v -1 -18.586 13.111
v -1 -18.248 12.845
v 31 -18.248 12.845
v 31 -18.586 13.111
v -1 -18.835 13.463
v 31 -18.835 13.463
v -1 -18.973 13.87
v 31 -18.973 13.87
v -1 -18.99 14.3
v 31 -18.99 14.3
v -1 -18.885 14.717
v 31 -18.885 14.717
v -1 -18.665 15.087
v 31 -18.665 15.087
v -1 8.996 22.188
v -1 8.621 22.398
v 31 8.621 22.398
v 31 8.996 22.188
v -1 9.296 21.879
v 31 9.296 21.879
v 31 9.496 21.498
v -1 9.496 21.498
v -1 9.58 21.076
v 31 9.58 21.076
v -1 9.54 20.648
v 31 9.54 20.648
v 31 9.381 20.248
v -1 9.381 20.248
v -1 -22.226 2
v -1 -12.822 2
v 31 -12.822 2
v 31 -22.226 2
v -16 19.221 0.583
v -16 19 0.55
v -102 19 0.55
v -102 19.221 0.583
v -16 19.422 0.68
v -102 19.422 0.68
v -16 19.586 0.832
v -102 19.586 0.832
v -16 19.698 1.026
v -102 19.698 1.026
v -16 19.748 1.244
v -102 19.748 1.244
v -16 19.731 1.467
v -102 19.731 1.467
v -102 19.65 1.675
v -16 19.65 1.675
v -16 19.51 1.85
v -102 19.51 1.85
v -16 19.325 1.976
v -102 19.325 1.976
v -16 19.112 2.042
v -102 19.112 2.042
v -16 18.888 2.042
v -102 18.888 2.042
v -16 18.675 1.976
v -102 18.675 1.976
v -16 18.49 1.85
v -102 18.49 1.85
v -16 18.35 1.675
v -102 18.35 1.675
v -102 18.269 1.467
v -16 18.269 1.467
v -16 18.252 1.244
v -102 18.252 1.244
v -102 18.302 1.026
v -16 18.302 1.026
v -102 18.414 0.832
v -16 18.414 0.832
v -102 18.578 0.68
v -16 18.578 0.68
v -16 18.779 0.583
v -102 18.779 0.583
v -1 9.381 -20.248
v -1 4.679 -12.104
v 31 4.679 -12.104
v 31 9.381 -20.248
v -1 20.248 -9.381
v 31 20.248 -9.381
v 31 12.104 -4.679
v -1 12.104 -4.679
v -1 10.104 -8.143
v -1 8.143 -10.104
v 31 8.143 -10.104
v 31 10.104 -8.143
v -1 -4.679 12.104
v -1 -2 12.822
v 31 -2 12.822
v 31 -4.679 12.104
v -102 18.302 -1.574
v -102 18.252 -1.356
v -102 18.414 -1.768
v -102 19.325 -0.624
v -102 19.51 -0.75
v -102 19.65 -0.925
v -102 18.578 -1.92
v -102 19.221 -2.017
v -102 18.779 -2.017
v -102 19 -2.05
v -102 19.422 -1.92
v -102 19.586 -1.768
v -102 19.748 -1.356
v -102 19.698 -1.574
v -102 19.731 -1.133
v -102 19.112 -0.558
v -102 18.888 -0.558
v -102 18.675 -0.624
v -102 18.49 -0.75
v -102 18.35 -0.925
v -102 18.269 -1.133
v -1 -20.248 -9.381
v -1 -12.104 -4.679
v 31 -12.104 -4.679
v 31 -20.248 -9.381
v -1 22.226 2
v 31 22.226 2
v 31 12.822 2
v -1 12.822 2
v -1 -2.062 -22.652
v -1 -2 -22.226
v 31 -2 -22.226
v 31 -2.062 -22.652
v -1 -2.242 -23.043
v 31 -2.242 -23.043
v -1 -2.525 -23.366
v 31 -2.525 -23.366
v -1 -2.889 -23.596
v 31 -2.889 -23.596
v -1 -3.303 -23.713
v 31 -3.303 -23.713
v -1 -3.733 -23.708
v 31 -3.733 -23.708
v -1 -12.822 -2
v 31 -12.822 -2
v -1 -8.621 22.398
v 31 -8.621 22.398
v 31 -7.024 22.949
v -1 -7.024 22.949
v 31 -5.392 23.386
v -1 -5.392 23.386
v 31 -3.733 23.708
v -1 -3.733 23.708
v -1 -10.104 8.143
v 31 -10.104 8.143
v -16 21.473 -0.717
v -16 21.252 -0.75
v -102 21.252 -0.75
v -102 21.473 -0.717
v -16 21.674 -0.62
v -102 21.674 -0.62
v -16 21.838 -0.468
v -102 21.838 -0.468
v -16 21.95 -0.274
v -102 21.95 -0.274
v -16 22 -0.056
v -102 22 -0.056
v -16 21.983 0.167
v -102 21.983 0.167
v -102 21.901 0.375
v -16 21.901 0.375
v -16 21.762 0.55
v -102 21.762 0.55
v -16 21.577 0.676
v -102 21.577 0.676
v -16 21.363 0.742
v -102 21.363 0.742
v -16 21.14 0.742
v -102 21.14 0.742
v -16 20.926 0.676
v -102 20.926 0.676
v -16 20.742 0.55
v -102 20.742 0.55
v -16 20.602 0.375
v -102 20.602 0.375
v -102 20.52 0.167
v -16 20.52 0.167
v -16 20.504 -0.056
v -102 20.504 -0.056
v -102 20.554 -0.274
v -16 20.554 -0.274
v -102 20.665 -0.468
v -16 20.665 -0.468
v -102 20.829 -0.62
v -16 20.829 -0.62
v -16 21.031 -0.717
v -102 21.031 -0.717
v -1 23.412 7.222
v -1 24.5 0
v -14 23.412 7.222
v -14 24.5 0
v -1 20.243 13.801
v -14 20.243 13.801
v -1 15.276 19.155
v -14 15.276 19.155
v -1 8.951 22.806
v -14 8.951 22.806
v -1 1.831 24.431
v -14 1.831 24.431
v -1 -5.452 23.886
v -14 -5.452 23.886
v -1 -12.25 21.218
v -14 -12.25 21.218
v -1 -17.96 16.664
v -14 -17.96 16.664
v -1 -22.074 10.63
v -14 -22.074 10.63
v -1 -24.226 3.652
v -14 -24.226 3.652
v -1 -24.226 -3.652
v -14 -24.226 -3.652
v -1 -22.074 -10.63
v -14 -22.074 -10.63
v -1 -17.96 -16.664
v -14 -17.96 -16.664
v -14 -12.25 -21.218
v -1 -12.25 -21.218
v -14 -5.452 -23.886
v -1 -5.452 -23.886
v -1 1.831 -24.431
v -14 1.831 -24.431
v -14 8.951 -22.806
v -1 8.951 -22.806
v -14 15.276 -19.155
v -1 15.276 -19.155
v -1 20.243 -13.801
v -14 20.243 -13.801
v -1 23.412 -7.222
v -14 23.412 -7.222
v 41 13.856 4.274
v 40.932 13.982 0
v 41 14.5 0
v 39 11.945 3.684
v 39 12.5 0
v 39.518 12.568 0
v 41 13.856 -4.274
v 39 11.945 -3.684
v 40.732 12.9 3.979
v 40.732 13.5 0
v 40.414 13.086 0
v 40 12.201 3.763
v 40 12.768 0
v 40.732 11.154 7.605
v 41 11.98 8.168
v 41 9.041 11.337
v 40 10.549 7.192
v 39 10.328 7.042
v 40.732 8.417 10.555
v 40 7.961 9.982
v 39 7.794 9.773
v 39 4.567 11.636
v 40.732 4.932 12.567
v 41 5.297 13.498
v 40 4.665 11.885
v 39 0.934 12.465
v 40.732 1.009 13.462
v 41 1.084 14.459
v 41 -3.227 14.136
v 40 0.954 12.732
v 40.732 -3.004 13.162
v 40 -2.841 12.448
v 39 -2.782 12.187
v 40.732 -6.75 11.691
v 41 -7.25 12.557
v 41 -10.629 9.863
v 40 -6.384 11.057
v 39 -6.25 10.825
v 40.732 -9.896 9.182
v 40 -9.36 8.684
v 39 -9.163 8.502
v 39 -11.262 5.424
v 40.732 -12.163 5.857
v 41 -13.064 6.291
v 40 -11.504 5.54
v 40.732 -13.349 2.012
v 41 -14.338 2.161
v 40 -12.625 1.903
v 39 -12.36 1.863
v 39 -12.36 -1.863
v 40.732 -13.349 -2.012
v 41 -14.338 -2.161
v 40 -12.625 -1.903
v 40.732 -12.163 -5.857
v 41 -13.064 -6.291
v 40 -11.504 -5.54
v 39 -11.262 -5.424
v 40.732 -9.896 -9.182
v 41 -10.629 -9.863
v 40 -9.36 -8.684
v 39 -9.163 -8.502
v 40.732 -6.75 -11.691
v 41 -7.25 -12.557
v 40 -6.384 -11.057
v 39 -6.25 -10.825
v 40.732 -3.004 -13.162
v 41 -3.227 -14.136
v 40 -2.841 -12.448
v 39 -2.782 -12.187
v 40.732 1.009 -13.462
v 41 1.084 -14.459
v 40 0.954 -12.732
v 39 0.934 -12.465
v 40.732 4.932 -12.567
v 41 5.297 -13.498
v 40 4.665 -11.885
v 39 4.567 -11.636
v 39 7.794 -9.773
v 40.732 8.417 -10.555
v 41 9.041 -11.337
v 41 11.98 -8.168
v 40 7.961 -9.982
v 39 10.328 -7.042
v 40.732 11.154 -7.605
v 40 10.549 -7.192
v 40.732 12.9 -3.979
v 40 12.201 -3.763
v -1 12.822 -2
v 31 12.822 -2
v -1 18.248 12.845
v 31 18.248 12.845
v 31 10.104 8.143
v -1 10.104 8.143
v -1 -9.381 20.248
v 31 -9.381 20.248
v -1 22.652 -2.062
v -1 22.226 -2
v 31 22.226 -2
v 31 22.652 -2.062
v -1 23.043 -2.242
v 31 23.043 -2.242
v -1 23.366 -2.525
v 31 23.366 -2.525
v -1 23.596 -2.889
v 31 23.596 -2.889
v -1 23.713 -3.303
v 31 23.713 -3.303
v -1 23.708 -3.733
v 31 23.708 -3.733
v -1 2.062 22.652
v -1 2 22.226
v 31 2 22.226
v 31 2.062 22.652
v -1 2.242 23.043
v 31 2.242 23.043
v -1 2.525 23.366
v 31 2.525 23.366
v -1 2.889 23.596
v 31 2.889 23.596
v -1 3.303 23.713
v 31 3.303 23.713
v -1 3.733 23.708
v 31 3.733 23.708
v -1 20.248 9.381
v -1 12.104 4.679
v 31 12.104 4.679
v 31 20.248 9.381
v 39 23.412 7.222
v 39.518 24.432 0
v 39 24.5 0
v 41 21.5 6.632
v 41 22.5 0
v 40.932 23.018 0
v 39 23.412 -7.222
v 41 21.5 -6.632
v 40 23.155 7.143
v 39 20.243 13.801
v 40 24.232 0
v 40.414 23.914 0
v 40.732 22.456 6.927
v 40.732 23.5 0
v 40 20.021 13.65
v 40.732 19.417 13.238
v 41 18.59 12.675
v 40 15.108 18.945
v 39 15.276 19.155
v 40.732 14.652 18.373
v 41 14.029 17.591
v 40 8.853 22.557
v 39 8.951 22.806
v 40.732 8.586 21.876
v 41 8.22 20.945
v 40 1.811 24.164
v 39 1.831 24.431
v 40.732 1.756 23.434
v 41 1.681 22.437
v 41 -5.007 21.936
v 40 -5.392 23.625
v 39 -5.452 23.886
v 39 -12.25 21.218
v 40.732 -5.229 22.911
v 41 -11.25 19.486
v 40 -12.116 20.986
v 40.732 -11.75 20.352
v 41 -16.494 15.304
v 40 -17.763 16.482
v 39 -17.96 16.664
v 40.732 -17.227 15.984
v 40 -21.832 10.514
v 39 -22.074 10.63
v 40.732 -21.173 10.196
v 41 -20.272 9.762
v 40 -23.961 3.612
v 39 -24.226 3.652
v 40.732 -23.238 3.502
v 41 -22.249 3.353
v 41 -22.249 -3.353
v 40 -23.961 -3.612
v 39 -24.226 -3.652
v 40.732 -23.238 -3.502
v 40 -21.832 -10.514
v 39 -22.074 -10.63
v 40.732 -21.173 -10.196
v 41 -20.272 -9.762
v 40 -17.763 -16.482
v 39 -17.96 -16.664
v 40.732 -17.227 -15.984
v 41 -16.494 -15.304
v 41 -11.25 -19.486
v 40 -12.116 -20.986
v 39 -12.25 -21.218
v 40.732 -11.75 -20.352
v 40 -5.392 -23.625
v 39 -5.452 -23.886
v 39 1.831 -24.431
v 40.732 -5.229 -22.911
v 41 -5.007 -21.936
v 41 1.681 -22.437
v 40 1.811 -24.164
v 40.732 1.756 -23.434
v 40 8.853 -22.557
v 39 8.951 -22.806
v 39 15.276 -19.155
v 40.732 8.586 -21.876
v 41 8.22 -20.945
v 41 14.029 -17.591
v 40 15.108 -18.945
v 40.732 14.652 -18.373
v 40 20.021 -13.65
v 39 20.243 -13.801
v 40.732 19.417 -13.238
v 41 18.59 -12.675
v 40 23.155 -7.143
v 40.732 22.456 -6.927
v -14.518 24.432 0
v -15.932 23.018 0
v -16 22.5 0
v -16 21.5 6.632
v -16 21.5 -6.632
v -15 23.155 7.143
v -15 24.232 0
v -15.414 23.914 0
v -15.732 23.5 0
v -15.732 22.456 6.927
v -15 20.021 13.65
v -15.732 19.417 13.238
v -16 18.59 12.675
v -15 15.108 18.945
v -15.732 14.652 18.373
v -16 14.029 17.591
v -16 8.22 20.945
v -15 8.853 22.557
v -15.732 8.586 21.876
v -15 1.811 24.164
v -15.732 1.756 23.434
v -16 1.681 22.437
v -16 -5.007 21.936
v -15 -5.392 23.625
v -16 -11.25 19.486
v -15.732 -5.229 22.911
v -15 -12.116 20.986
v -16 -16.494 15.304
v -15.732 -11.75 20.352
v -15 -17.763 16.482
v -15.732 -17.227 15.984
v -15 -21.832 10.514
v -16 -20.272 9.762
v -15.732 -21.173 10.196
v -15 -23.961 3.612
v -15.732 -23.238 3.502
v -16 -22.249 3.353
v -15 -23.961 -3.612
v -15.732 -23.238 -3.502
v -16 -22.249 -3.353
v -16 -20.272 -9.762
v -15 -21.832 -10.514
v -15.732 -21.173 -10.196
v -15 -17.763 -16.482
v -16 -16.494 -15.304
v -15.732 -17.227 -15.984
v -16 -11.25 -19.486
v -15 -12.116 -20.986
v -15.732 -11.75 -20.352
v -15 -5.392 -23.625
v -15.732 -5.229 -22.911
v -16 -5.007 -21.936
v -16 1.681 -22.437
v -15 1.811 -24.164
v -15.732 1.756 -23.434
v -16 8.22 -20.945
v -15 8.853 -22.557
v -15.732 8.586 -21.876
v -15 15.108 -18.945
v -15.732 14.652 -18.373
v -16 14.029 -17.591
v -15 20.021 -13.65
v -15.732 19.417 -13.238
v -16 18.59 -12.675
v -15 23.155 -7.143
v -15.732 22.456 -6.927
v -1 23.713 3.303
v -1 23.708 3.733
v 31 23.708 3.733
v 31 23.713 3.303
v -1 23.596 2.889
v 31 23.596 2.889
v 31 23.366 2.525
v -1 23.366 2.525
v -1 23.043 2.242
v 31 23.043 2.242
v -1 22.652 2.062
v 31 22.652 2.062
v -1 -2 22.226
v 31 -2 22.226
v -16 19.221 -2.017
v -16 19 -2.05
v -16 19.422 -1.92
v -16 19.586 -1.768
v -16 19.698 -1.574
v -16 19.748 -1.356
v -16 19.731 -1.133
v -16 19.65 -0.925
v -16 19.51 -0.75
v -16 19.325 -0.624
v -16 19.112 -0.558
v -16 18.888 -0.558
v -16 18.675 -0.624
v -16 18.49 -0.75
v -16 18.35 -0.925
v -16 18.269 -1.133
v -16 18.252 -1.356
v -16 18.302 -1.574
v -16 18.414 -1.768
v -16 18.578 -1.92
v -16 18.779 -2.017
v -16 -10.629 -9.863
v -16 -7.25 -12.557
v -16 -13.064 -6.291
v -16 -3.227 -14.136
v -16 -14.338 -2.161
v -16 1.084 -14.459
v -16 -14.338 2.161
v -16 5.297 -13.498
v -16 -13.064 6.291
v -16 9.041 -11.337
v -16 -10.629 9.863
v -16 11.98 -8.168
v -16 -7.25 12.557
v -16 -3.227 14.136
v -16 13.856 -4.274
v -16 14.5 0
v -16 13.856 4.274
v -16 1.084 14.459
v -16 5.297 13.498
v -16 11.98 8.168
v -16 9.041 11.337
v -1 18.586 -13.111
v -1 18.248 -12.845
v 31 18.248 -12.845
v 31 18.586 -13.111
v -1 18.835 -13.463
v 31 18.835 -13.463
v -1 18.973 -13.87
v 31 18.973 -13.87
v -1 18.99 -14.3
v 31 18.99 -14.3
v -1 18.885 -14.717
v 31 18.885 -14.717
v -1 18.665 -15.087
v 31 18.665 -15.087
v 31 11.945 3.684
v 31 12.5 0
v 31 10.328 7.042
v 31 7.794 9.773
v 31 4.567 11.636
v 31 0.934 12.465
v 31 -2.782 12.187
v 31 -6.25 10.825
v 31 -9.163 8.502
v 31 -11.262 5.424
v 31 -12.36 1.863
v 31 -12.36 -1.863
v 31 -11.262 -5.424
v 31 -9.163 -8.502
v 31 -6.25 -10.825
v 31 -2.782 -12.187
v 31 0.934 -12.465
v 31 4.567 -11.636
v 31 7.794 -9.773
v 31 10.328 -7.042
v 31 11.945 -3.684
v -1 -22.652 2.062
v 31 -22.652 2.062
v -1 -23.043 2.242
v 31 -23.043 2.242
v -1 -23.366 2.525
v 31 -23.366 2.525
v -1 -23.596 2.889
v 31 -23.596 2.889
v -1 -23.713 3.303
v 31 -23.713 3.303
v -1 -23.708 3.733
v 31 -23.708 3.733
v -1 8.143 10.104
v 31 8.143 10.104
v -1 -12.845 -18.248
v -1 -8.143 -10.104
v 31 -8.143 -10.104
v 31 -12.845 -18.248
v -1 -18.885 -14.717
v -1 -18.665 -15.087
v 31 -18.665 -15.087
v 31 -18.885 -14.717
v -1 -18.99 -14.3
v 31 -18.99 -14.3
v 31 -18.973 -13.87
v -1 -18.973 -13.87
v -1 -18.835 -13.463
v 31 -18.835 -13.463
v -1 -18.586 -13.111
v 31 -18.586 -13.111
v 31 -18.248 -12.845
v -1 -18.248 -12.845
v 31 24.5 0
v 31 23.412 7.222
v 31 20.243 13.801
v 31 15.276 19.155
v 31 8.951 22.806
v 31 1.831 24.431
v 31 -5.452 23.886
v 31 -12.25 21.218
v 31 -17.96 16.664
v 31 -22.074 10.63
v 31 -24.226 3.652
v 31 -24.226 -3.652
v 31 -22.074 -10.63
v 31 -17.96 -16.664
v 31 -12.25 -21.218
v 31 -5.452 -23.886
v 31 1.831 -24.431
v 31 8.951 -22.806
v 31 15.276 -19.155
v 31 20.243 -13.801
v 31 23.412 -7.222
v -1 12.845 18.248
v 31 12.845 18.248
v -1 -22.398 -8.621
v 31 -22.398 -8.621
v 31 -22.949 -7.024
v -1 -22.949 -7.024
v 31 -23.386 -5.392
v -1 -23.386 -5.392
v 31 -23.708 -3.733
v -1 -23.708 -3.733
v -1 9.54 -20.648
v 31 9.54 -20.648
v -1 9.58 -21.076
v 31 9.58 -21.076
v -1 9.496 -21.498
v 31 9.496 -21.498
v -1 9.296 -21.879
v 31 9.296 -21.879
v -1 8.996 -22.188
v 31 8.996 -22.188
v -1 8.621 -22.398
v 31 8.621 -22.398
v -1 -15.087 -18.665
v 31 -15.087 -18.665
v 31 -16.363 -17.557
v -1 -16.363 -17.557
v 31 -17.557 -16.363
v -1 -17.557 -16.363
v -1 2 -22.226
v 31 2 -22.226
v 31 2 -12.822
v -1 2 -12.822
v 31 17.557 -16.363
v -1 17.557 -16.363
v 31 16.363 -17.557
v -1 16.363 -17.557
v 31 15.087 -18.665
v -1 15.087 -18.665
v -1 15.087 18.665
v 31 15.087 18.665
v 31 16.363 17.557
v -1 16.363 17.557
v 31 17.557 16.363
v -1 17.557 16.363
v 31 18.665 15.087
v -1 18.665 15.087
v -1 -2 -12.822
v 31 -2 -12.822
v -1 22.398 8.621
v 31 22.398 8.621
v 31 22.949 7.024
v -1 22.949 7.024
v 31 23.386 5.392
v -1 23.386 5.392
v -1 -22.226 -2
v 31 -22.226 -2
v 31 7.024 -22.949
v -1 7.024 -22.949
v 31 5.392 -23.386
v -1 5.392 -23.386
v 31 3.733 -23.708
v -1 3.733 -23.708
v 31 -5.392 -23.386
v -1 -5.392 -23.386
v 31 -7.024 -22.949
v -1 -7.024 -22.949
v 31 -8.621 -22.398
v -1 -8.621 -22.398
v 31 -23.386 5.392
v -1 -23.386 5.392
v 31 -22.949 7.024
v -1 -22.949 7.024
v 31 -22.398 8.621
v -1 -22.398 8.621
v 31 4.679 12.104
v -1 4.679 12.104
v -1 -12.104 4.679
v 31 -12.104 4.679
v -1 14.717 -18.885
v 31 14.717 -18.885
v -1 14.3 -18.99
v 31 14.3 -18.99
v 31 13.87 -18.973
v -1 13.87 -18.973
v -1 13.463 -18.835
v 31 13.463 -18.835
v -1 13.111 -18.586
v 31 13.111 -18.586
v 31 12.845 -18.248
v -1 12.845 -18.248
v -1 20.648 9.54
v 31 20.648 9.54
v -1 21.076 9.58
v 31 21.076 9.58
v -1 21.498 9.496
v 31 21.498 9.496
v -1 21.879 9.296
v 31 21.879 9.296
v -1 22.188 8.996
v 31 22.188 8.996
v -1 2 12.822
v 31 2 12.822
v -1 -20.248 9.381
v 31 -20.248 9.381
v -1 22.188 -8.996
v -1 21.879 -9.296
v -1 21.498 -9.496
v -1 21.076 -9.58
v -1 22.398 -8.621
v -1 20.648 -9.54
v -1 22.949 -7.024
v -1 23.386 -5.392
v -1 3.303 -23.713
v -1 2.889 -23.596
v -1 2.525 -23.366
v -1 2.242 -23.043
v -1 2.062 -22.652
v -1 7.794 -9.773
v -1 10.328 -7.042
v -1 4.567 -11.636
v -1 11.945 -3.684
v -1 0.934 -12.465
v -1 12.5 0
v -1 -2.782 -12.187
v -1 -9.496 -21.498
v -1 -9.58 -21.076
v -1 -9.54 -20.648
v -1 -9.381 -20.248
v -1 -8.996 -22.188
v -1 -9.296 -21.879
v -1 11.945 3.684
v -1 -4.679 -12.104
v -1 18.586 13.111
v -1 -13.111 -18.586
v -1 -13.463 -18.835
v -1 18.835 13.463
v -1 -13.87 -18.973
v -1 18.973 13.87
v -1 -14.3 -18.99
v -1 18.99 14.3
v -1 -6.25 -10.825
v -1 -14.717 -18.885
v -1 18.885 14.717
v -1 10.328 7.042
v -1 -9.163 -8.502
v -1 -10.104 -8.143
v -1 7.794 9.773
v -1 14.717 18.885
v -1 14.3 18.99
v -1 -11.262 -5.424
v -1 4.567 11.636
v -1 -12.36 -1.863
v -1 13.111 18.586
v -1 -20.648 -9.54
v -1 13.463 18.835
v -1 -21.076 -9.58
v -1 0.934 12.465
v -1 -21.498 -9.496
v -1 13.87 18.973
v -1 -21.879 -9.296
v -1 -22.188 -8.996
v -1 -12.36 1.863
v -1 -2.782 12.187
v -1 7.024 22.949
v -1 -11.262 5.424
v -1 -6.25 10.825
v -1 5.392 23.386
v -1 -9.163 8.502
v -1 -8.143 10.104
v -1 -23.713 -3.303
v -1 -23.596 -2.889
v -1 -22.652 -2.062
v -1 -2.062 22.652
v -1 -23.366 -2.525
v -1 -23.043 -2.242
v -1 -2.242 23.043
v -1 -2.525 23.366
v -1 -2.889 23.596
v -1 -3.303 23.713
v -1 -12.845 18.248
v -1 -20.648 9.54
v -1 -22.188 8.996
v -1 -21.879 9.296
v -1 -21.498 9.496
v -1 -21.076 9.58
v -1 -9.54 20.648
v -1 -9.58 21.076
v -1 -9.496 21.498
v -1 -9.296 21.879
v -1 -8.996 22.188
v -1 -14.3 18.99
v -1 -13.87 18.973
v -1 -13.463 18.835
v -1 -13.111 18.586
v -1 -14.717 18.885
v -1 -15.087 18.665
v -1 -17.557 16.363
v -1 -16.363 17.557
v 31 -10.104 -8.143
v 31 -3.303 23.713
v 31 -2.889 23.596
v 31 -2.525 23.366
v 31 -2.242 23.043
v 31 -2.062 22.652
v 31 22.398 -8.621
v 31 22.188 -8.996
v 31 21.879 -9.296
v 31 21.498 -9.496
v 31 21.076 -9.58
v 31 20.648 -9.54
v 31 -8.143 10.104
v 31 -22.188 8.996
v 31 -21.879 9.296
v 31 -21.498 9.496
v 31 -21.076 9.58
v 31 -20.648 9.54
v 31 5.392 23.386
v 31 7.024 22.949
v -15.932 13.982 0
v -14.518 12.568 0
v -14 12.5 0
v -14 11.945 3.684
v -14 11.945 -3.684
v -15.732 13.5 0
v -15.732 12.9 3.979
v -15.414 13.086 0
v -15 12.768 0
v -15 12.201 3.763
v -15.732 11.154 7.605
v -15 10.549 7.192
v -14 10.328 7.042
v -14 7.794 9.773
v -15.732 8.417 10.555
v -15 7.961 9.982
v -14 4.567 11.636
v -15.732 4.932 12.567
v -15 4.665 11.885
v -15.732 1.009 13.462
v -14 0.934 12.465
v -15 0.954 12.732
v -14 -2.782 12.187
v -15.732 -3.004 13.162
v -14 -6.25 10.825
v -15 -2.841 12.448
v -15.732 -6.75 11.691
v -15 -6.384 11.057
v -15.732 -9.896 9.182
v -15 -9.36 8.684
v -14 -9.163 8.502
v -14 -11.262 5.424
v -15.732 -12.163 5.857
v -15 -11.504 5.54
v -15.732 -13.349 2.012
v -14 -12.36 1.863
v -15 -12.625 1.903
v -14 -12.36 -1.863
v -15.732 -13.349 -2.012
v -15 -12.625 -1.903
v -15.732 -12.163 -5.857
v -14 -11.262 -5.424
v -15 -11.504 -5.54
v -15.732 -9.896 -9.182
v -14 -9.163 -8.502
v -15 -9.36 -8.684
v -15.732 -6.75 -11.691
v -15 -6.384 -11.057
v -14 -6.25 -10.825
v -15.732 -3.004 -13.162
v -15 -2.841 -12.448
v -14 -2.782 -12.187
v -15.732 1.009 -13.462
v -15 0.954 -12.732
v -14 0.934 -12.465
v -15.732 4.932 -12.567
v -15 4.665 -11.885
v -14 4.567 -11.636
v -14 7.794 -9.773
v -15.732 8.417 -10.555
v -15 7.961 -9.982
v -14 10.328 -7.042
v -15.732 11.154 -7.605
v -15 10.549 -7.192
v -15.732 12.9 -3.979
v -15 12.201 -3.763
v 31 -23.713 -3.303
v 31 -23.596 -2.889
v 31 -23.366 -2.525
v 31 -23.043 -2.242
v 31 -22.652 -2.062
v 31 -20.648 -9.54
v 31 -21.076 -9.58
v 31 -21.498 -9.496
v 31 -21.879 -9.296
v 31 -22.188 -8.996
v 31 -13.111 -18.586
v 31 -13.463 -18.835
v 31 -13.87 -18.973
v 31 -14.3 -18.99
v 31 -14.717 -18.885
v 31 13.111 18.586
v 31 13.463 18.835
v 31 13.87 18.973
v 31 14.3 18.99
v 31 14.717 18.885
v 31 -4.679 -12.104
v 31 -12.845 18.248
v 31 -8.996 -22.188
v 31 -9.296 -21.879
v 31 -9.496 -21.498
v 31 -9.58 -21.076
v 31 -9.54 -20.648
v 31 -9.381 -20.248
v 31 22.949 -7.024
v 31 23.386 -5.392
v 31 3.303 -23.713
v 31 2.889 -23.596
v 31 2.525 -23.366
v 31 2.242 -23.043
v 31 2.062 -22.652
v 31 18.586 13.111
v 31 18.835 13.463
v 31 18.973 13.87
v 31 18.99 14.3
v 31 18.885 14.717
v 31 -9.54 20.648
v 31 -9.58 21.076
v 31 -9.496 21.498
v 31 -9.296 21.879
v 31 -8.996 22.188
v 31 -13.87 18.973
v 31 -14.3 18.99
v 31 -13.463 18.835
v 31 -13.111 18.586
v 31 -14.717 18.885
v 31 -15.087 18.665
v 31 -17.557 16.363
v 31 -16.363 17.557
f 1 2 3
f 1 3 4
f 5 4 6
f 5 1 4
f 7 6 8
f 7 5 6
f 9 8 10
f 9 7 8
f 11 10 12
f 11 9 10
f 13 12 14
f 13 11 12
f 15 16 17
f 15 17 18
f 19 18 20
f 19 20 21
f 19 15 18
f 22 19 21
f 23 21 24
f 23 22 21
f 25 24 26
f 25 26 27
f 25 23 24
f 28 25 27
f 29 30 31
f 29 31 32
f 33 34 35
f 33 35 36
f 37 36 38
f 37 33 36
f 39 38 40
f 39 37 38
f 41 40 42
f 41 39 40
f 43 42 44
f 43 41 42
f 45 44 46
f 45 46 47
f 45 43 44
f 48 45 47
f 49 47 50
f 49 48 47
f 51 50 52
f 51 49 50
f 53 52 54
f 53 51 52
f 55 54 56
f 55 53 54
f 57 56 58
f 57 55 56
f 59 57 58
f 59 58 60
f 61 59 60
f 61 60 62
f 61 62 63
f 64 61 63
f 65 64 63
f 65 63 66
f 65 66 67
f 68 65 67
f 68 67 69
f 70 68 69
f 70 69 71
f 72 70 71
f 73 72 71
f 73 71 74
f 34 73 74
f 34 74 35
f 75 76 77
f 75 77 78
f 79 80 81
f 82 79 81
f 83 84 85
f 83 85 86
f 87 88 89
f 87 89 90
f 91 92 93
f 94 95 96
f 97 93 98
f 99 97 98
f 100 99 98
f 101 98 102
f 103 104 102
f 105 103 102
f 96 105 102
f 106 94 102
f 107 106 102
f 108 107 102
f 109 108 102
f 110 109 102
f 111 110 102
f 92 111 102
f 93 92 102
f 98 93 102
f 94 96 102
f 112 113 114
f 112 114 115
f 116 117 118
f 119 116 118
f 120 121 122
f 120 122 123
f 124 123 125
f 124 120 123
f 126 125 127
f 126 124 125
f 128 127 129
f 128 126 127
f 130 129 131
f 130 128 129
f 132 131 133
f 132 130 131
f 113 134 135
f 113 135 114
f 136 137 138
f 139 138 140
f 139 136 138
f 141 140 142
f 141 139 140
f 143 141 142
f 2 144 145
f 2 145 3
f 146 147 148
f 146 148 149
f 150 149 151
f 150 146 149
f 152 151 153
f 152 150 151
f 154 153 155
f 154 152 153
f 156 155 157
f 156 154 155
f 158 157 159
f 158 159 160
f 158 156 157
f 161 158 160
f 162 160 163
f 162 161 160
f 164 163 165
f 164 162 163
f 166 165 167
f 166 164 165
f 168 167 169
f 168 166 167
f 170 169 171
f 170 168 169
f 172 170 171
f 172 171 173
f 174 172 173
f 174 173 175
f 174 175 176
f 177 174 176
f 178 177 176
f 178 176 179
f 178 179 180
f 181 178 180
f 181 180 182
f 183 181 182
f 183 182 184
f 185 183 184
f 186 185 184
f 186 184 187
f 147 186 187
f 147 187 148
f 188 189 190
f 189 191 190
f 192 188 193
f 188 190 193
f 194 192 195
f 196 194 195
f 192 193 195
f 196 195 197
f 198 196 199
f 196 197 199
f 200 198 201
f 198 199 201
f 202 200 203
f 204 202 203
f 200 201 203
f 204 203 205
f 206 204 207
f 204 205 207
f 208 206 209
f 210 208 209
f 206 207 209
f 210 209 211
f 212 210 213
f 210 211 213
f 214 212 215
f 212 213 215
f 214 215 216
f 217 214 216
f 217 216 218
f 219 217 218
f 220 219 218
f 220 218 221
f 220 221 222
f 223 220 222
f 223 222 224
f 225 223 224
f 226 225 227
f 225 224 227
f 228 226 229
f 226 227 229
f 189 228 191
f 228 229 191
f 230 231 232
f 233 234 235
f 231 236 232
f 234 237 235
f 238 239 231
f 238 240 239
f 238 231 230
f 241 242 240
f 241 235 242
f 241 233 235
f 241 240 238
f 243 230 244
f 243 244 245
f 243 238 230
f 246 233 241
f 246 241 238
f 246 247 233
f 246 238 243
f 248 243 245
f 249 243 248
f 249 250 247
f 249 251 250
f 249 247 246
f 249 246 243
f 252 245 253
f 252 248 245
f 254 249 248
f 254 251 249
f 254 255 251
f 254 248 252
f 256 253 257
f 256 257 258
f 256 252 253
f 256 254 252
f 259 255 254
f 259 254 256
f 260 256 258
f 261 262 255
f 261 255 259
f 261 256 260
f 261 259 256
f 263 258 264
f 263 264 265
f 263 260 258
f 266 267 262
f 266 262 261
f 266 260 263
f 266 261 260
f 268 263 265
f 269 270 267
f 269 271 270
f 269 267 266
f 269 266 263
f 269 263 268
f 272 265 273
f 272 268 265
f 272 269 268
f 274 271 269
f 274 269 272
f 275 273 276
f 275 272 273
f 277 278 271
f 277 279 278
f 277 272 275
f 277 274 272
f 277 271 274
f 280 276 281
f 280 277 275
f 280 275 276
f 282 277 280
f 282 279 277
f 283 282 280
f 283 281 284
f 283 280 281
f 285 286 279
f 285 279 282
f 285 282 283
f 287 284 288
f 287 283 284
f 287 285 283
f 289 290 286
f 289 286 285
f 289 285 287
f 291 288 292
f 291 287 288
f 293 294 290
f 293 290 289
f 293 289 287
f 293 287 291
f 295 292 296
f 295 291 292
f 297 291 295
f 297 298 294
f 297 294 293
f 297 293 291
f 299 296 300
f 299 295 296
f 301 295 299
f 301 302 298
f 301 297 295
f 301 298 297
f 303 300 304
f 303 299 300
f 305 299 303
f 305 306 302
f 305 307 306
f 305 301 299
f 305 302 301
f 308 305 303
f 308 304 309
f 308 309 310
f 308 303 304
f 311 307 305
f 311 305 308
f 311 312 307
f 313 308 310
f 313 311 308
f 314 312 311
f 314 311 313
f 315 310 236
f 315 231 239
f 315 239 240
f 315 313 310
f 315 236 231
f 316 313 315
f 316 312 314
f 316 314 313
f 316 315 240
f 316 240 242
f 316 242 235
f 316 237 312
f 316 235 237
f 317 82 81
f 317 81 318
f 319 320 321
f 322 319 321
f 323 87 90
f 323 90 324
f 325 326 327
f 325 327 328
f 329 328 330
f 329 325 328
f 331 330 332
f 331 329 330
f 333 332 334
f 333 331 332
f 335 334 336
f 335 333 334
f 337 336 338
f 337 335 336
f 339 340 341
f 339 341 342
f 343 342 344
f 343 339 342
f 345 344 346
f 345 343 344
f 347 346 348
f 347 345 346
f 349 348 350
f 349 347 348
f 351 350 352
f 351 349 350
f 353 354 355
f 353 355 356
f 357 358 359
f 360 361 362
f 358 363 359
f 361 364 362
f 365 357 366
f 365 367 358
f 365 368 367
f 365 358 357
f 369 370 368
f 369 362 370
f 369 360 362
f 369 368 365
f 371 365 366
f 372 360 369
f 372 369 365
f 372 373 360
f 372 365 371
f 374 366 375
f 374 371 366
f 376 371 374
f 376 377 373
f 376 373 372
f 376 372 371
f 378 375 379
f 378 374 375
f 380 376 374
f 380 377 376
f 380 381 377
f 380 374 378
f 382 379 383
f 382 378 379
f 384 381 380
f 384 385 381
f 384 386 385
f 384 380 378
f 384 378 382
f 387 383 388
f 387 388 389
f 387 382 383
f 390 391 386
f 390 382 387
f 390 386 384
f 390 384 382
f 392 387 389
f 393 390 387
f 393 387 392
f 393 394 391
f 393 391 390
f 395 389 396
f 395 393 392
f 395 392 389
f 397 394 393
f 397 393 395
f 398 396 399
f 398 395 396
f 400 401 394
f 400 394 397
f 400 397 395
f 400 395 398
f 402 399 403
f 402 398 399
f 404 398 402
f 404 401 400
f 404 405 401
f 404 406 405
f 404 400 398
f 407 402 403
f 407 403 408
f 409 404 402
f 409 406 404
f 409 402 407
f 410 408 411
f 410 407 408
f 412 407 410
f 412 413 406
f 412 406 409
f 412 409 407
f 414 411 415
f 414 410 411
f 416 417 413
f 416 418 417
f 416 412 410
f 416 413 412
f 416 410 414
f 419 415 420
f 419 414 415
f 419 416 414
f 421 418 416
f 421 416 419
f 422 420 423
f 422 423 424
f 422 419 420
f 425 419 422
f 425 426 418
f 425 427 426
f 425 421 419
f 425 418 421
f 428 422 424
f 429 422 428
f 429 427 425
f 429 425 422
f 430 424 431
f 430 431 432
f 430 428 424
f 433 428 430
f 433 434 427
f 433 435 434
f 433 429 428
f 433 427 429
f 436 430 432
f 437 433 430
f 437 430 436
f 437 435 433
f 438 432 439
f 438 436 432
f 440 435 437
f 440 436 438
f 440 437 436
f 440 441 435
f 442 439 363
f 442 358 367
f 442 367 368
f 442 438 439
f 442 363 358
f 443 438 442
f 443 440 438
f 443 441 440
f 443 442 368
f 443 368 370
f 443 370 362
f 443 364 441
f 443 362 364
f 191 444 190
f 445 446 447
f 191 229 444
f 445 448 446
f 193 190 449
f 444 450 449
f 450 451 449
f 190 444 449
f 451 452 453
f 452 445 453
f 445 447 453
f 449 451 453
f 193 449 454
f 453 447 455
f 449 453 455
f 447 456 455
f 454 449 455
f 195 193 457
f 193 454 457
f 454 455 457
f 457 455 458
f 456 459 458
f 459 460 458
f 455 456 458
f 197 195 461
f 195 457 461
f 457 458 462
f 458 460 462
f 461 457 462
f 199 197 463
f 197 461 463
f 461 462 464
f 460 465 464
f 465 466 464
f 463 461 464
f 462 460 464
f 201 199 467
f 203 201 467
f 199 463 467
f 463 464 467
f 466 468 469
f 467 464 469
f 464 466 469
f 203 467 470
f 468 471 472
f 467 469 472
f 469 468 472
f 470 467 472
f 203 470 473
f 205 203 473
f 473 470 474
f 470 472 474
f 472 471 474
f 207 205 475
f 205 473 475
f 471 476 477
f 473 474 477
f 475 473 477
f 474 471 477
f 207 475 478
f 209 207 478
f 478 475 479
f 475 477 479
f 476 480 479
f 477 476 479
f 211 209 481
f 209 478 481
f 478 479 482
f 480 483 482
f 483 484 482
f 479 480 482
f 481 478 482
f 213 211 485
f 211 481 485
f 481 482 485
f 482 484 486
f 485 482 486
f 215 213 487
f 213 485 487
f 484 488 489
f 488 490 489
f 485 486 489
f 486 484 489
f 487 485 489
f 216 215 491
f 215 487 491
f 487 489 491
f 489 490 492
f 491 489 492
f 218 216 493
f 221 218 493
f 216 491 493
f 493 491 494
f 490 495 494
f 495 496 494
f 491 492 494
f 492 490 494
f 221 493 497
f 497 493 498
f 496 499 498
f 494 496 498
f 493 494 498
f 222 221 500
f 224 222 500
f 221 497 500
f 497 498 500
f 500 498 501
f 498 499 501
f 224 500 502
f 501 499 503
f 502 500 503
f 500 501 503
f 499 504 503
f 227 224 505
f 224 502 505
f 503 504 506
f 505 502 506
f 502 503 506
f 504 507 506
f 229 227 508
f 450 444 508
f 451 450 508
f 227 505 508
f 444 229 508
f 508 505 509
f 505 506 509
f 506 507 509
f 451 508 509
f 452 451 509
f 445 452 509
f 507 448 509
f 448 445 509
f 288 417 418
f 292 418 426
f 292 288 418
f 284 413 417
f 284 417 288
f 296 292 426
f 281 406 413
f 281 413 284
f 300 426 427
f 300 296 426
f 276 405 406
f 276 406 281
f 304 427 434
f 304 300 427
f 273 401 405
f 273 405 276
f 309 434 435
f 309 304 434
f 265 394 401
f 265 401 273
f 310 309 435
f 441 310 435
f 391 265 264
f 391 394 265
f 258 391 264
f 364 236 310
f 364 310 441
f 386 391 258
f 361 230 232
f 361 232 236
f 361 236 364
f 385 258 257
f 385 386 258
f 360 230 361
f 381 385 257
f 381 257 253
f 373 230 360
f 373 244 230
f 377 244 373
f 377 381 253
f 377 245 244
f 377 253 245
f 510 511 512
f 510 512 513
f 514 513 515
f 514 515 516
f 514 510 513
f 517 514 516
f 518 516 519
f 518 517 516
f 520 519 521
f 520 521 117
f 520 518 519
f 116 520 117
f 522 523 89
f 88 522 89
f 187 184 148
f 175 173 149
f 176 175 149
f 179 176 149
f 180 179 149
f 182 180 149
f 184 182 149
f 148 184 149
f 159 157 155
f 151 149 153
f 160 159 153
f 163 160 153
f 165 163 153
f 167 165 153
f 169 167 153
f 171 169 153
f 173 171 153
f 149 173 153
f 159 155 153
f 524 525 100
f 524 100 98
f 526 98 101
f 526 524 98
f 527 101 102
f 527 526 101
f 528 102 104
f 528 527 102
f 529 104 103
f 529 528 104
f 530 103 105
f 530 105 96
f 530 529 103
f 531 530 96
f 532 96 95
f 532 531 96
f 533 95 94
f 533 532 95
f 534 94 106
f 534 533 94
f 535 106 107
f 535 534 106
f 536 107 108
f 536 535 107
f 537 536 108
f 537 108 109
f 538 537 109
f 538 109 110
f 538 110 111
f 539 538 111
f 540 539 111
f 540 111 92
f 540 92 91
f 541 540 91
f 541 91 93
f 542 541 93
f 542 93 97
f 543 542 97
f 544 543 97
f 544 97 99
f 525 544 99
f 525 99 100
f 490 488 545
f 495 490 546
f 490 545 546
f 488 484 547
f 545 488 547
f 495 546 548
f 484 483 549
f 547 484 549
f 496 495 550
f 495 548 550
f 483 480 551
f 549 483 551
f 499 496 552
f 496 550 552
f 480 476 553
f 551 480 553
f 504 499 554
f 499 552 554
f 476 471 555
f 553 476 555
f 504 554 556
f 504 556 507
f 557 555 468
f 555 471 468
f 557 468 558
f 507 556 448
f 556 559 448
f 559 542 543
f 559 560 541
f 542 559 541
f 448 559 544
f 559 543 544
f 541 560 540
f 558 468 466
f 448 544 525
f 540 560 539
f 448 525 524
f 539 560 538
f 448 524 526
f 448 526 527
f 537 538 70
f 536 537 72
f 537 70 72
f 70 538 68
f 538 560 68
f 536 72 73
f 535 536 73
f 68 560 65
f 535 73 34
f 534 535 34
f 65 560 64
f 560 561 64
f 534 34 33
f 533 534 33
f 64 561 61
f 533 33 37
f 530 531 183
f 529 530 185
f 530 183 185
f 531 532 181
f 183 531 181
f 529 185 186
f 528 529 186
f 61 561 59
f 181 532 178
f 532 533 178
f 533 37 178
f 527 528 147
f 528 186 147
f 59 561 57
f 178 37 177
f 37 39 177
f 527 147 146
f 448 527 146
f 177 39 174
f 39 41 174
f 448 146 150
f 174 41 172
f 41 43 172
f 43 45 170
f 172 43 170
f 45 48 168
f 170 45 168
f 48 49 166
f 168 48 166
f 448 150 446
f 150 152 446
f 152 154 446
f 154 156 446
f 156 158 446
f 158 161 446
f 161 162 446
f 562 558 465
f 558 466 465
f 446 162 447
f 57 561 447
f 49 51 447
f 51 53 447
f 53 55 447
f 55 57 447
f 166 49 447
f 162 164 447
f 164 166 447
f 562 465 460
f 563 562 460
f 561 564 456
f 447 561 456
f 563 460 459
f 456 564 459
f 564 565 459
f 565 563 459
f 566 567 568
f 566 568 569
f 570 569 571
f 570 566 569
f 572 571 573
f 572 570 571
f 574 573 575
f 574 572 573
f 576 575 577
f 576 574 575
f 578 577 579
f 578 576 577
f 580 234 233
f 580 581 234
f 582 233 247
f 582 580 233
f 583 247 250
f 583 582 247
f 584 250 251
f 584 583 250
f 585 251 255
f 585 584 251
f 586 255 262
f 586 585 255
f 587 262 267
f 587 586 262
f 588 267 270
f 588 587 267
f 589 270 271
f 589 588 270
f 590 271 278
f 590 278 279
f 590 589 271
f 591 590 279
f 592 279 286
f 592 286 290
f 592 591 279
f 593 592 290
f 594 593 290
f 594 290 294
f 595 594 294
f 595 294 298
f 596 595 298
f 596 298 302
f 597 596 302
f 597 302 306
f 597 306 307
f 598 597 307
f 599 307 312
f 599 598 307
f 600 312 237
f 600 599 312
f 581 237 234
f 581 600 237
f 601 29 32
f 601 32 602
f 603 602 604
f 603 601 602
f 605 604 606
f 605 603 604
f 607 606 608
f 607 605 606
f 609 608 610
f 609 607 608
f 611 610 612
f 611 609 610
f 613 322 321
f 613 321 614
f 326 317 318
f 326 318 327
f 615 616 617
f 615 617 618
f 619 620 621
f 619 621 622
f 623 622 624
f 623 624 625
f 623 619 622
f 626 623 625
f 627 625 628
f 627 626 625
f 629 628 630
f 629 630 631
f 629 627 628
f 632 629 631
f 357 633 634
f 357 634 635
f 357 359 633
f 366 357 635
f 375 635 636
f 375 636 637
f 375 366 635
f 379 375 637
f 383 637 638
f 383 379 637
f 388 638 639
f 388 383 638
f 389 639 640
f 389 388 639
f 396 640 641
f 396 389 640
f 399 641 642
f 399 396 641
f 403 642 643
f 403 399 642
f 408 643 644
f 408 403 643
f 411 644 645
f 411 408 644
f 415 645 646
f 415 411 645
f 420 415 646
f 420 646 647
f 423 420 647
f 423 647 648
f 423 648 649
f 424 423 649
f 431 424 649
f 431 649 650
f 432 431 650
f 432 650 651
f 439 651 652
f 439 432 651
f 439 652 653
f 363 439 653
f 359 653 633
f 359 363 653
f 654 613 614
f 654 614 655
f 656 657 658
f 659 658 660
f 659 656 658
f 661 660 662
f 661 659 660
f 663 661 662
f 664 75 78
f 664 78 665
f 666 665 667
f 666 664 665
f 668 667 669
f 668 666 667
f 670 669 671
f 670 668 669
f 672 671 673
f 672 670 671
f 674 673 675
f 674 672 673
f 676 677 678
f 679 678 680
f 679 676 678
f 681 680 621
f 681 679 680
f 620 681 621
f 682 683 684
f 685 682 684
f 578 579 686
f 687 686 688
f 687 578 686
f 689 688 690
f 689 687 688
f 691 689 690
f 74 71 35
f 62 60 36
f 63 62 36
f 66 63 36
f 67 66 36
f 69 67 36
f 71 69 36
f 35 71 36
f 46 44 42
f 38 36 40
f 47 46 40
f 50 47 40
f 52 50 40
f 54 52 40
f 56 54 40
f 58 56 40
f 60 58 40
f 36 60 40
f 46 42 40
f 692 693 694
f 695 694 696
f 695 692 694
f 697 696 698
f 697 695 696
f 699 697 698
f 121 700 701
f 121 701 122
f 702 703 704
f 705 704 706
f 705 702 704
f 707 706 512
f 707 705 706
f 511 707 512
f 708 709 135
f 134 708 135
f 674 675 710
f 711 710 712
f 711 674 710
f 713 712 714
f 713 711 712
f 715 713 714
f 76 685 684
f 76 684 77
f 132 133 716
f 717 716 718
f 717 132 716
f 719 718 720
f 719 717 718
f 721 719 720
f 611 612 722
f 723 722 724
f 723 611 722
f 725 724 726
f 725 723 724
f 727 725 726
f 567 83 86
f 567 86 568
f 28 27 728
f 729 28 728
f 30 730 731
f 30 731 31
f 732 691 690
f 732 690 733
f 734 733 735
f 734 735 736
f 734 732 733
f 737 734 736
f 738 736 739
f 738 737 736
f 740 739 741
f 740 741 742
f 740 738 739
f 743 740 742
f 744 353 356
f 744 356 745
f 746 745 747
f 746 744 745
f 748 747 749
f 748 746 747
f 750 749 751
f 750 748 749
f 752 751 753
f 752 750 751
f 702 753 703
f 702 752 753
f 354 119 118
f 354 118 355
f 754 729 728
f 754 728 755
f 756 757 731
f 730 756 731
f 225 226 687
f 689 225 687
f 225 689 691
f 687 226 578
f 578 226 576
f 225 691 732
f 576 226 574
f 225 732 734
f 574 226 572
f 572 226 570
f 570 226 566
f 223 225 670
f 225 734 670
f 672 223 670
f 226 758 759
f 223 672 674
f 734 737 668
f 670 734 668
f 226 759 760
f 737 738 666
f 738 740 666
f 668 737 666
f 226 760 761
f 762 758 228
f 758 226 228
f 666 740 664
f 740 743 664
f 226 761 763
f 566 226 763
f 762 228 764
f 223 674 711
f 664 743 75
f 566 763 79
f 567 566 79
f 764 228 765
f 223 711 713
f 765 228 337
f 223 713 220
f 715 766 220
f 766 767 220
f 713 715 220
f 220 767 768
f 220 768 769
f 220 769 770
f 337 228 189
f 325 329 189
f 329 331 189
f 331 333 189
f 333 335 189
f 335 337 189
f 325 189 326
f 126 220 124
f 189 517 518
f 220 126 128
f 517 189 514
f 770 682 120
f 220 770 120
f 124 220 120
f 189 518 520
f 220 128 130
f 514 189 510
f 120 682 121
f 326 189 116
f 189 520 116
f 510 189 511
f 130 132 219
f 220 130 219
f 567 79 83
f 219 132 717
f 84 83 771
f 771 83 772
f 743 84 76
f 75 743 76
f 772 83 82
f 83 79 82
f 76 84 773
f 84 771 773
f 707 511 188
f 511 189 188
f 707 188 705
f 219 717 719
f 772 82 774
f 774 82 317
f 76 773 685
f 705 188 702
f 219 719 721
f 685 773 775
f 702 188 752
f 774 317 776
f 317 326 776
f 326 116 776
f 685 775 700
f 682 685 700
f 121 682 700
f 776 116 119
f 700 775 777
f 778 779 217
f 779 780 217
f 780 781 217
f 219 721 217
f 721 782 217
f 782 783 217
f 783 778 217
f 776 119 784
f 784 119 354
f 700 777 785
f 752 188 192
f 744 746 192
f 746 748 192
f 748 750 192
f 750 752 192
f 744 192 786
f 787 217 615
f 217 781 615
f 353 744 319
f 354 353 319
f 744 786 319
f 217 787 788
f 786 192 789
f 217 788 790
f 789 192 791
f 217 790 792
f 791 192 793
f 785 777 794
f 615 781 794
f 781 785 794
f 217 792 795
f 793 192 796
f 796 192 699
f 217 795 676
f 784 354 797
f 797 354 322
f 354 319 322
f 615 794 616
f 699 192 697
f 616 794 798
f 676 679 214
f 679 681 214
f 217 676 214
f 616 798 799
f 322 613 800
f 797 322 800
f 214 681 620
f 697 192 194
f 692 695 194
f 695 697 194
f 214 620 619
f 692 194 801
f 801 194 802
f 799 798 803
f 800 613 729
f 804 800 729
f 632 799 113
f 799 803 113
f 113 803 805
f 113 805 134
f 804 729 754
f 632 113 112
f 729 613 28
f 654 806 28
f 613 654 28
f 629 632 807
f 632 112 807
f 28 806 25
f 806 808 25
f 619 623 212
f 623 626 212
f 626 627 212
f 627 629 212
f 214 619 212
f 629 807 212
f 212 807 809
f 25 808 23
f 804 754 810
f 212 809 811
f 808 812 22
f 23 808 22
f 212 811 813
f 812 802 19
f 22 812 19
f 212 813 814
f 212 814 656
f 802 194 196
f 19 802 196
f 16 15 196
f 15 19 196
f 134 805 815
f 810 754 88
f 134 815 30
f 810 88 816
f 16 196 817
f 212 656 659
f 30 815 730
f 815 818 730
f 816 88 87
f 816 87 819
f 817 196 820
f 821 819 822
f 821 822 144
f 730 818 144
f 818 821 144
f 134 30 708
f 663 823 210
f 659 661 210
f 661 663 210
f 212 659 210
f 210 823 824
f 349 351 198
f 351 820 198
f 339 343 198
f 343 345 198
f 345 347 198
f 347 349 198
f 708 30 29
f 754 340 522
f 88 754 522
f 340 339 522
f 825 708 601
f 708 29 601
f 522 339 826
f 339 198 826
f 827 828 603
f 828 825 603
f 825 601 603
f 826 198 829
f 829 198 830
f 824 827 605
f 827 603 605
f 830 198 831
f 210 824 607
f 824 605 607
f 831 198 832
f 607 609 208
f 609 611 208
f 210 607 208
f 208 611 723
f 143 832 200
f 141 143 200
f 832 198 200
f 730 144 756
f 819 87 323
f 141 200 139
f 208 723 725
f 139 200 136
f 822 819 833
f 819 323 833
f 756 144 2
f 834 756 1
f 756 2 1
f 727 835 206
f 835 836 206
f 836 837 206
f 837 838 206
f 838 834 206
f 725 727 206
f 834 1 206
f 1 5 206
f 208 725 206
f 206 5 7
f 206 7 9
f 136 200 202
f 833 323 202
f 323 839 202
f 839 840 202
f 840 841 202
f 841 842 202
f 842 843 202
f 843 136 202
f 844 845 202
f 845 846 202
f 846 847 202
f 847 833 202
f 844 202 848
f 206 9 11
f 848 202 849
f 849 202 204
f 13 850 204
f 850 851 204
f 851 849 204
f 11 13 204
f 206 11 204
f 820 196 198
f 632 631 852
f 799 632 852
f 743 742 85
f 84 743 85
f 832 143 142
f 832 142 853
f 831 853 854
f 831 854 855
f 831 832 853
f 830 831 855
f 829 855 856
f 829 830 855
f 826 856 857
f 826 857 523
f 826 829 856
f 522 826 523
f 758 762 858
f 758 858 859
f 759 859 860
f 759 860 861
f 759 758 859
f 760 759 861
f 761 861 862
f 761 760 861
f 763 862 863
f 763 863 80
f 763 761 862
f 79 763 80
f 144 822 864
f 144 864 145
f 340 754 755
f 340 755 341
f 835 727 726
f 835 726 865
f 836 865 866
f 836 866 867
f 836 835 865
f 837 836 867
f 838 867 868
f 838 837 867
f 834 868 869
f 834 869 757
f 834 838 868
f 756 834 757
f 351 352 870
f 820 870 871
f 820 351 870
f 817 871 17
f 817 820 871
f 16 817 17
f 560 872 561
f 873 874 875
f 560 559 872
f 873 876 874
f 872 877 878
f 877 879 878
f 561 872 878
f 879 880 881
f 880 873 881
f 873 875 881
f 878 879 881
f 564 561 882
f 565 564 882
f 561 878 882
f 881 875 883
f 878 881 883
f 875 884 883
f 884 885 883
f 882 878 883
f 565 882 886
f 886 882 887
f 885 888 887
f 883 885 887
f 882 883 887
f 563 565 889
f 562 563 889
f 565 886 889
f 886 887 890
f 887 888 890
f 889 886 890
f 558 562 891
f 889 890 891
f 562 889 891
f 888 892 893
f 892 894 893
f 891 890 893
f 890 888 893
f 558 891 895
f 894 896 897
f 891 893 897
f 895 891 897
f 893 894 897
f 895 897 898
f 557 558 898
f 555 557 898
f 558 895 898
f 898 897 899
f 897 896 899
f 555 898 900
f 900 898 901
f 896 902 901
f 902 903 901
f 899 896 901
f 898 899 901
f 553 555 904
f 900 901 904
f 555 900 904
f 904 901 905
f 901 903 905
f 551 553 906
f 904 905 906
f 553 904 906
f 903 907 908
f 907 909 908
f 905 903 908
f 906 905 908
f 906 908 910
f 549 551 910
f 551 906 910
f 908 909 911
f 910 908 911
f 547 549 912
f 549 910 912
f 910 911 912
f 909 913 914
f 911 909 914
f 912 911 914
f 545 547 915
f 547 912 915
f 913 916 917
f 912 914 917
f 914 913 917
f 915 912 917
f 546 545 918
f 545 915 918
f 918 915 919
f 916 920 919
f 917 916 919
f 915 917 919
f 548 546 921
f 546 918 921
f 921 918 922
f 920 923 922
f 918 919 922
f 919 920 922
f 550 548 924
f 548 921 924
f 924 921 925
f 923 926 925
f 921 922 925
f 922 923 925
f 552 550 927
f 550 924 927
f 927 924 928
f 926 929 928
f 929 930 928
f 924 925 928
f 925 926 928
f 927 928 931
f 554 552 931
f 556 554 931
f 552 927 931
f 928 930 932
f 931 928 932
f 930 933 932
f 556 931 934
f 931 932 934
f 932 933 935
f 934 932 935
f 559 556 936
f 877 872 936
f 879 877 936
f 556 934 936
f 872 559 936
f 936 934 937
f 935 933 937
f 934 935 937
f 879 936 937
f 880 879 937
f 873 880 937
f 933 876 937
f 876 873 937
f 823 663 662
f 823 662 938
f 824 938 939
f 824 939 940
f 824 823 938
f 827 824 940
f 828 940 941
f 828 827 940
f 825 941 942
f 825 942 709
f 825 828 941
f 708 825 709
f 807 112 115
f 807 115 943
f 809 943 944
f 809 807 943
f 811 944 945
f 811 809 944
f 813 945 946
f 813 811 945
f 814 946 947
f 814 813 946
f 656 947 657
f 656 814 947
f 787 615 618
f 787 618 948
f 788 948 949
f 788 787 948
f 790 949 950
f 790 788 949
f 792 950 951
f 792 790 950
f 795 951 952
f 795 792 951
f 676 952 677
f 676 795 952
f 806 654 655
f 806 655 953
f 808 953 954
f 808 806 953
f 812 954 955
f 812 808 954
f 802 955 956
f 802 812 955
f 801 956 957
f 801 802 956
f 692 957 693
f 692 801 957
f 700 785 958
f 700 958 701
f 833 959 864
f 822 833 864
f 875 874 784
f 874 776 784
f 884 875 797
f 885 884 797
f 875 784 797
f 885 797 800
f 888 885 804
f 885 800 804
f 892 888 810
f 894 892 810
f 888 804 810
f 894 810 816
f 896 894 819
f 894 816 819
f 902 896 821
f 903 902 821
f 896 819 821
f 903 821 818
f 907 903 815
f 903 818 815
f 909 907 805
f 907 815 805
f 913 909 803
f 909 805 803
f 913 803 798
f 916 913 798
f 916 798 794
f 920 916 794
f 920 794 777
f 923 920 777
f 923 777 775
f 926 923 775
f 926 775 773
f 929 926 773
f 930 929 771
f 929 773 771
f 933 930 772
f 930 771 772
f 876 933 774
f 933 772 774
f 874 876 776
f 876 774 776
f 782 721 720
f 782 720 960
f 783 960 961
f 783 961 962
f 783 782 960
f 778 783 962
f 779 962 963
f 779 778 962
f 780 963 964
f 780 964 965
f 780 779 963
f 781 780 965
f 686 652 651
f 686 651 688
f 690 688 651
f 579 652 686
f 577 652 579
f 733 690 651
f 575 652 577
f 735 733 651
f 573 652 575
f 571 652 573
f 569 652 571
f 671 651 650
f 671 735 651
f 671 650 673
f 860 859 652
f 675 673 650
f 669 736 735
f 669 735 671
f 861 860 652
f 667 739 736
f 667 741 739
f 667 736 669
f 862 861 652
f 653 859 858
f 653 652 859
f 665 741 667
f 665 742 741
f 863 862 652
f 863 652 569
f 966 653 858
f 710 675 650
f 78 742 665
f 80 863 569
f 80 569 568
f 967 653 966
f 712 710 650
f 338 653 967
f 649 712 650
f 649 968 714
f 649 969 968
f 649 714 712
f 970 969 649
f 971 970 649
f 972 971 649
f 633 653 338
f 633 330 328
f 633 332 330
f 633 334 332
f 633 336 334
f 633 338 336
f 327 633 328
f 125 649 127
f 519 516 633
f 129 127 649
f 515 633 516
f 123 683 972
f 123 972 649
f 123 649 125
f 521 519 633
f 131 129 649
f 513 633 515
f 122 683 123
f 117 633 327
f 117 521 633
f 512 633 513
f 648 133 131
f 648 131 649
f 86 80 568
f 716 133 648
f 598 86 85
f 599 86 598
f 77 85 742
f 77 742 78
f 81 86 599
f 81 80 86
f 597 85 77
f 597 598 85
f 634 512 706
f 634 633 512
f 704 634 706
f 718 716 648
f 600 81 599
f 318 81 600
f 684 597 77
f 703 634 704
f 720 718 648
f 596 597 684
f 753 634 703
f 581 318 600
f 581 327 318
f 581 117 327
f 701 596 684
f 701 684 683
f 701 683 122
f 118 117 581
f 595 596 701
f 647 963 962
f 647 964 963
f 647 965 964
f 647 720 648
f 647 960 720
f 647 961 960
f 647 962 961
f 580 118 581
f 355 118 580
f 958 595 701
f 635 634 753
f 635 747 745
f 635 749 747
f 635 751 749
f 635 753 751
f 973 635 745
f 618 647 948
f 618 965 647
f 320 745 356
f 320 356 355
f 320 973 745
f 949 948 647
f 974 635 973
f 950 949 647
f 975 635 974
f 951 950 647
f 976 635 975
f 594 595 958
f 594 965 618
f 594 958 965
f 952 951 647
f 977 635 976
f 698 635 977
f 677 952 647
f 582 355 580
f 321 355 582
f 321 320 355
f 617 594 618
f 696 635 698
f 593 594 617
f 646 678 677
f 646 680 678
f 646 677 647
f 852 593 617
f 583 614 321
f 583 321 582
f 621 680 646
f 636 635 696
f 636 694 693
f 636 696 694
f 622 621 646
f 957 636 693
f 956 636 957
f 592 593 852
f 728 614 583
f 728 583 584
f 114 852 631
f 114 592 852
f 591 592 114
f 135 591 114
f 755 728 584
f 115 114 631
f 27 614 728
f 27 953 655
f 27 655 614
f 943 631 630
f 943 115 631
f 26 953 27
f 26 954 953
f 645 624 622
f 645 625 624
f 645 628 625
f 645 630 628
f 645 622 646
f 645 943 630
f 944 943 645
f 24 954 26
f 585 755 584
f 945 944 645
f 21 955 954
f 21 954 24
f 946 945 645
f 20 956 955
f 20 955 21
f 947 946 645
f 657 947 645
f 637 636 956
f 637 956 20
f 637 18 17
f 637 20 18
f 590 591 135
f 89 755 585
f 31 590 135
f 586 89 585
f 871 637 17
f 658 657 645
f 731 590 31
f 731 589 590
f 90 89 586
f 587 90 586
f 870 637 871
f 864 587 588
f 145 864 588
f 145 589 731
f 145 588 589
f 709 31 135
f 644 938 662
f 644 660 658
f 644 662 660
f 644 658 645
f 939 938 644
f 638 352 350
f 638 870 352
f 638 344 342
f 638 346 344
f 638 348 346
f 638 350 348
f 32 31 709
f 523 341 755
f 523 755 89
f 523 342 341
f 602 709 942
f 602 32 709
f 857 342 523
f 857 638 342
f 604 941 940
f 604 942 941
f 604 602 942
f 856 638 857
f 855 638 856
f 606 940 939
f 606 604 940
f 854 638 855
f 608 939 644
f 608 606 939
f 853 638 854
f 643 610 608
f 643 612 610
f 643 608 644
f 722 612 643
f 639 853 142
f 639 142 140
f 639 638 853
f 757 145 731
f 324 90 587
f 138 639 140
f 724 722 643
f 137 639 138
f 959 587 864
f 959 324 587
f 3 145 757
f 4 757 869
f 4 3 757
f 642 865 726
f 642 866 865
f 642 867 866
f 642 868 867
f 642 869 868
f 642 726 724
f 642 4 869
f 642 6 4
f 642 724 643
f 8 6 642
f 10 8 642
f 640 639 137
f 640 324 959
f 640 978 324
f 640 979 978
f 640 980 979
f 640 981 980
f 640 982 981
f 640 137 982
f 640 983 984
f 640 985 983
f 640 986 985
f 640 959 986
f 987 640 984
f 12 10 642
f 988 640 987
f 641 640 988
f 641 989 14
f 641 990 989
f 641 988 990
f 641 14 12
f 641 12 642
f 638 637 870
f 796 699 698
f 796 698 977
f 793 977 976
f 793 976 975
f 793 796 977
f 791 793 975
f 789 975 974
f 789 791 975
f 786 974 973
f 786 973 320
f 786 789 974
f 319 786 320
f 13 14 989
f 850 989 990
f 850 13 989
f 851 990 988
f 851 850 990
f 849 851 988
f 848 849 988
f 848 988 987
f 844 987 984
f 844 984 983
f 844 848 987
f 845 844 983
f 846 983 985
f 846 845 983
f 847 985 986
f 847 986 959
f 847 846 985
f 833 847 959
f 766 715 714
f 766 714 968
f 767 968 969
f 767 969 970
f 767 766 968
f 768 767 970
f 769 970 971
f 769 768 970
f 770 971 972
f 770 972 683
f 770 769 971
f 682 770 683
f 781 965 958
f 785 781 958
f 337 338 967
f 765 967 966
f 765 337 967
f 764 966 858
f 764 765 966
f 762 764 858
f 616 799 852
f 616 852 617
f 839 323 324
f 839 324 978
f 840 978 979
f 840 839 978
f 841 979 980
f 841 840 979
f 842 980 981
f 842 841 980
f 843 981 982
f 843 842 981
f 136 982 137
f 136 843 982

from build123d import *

# Parameters (mm, degrees)
BOSS_EXTRUDE1_START = -1
BOSS_EXTRUDE1_DEPTH = 32
CIRPATTERN3_COUNT   = 12
BOSS_EXTRUDE2_START = -2
SKETCH5_R           = 0.75
BOSS_EXTRUDE2_DEPTH = 100


with BuildPart() as part:
    # Sketch3 → Boss-Extrude1 (new body)
    with BuildSketch(Plane(origin=(0, 0, 0), x_dir=(0, 0, -1), z_dir=(1, 0, 0)).offset(BOSS_EXTRUDE1_START)):
        with BuildLine():
            Line((-2, 22.226110771), (-2, 12.821942467))
            Line((-2, 12.821942467), (-4.678920426, 12.104127903))
            Line((-4.678920426, 12.104127903), (-9.381004578, 20.248376555))
            ThreePointArc((-9.381004578, 20.248376555), (-9.496151336, 21.498457721), (-8.620764237, 22.398268325))
            ThreePointArc((-8.620764237, 22.398268325), (-6.211657082, 23.182219831), (-3.733333333, 23.707851489))
            ThreePointArc((-3.733333333, 23.707851489), (-2.525320566, 23.366286196), (-2, 22.226110771))
        make_face()
    boss_extrude1 = extrude(amount=BOSS_EXTRUDE1_DEPTH)

    # Sketch4 → Revolve1 (revolve)
    with BuildSketch(Plane.XY):
        with BuildLine():
            Line((-1, 24.5), (-14, 24.5))
            ThreePointArc((-14, 24.5), (-15.414213562, 23.914213562), (-16, 22.5))
            Line((-16, 22.5), (-16, 14.5))
            ThreePointArc((-16, 14.5), (-15.414213562, 13.085786438), (-14, 12.5))
            Line((-14, 12.5), (-1, 12.5))
            Line((-1, 12.5), (-1, 24.5))
        make_face()
        with BuildLine():
            Line((31, 24.5), (39, 24.5))
            ThreePointArc((39, 24.5), (40.414213562, 23.914213562), (41, 22.5))
            Line((41, 22.5), (41, 14.5))
            ThreePointArc((41, 14.5), (40.414213562, 13.085786438), (39, 12.5))
            Line((39, 12.5), (31, 12.5))
            Line((31, 12.5), (31, 24.5))
        make_face()
    revolve(axis=Axis((-2, 0, 0), (1, 0, 0)))

    # CirPattern3: Boss-Extrude1 ×12 about axis
    cirpattern3_axis = Axis((0, 0, 0), (1, 0, 0))
    for i in range(1, CIRPATTERN3_COUNT):
        add(boss_extrude1.rotate(cirpattern3_axis, i * 360 / CIRPATTERN3_COUNT))

    # Sketch5 → Boss-Extrude2 (add)
    with BuildSketch(Plane(origin=(0, 0, 0), x_dir=(0, 0, -1), z_dir=(1, 0, 0)).offset(BOSS_EXTRUDE2_START)):
        with Locations((-1.3, 19)):
            Circle(SKETCH5_R)
        with Locations((0, 21.25166605)):
            Circle(SKETCH5_R)
        with Locations((1.3, 19)):
            Circle(SKETCH5_R)
    extrude(amount=-BOSS_EXTRUDE2_DEPTH)


solid = part.part
